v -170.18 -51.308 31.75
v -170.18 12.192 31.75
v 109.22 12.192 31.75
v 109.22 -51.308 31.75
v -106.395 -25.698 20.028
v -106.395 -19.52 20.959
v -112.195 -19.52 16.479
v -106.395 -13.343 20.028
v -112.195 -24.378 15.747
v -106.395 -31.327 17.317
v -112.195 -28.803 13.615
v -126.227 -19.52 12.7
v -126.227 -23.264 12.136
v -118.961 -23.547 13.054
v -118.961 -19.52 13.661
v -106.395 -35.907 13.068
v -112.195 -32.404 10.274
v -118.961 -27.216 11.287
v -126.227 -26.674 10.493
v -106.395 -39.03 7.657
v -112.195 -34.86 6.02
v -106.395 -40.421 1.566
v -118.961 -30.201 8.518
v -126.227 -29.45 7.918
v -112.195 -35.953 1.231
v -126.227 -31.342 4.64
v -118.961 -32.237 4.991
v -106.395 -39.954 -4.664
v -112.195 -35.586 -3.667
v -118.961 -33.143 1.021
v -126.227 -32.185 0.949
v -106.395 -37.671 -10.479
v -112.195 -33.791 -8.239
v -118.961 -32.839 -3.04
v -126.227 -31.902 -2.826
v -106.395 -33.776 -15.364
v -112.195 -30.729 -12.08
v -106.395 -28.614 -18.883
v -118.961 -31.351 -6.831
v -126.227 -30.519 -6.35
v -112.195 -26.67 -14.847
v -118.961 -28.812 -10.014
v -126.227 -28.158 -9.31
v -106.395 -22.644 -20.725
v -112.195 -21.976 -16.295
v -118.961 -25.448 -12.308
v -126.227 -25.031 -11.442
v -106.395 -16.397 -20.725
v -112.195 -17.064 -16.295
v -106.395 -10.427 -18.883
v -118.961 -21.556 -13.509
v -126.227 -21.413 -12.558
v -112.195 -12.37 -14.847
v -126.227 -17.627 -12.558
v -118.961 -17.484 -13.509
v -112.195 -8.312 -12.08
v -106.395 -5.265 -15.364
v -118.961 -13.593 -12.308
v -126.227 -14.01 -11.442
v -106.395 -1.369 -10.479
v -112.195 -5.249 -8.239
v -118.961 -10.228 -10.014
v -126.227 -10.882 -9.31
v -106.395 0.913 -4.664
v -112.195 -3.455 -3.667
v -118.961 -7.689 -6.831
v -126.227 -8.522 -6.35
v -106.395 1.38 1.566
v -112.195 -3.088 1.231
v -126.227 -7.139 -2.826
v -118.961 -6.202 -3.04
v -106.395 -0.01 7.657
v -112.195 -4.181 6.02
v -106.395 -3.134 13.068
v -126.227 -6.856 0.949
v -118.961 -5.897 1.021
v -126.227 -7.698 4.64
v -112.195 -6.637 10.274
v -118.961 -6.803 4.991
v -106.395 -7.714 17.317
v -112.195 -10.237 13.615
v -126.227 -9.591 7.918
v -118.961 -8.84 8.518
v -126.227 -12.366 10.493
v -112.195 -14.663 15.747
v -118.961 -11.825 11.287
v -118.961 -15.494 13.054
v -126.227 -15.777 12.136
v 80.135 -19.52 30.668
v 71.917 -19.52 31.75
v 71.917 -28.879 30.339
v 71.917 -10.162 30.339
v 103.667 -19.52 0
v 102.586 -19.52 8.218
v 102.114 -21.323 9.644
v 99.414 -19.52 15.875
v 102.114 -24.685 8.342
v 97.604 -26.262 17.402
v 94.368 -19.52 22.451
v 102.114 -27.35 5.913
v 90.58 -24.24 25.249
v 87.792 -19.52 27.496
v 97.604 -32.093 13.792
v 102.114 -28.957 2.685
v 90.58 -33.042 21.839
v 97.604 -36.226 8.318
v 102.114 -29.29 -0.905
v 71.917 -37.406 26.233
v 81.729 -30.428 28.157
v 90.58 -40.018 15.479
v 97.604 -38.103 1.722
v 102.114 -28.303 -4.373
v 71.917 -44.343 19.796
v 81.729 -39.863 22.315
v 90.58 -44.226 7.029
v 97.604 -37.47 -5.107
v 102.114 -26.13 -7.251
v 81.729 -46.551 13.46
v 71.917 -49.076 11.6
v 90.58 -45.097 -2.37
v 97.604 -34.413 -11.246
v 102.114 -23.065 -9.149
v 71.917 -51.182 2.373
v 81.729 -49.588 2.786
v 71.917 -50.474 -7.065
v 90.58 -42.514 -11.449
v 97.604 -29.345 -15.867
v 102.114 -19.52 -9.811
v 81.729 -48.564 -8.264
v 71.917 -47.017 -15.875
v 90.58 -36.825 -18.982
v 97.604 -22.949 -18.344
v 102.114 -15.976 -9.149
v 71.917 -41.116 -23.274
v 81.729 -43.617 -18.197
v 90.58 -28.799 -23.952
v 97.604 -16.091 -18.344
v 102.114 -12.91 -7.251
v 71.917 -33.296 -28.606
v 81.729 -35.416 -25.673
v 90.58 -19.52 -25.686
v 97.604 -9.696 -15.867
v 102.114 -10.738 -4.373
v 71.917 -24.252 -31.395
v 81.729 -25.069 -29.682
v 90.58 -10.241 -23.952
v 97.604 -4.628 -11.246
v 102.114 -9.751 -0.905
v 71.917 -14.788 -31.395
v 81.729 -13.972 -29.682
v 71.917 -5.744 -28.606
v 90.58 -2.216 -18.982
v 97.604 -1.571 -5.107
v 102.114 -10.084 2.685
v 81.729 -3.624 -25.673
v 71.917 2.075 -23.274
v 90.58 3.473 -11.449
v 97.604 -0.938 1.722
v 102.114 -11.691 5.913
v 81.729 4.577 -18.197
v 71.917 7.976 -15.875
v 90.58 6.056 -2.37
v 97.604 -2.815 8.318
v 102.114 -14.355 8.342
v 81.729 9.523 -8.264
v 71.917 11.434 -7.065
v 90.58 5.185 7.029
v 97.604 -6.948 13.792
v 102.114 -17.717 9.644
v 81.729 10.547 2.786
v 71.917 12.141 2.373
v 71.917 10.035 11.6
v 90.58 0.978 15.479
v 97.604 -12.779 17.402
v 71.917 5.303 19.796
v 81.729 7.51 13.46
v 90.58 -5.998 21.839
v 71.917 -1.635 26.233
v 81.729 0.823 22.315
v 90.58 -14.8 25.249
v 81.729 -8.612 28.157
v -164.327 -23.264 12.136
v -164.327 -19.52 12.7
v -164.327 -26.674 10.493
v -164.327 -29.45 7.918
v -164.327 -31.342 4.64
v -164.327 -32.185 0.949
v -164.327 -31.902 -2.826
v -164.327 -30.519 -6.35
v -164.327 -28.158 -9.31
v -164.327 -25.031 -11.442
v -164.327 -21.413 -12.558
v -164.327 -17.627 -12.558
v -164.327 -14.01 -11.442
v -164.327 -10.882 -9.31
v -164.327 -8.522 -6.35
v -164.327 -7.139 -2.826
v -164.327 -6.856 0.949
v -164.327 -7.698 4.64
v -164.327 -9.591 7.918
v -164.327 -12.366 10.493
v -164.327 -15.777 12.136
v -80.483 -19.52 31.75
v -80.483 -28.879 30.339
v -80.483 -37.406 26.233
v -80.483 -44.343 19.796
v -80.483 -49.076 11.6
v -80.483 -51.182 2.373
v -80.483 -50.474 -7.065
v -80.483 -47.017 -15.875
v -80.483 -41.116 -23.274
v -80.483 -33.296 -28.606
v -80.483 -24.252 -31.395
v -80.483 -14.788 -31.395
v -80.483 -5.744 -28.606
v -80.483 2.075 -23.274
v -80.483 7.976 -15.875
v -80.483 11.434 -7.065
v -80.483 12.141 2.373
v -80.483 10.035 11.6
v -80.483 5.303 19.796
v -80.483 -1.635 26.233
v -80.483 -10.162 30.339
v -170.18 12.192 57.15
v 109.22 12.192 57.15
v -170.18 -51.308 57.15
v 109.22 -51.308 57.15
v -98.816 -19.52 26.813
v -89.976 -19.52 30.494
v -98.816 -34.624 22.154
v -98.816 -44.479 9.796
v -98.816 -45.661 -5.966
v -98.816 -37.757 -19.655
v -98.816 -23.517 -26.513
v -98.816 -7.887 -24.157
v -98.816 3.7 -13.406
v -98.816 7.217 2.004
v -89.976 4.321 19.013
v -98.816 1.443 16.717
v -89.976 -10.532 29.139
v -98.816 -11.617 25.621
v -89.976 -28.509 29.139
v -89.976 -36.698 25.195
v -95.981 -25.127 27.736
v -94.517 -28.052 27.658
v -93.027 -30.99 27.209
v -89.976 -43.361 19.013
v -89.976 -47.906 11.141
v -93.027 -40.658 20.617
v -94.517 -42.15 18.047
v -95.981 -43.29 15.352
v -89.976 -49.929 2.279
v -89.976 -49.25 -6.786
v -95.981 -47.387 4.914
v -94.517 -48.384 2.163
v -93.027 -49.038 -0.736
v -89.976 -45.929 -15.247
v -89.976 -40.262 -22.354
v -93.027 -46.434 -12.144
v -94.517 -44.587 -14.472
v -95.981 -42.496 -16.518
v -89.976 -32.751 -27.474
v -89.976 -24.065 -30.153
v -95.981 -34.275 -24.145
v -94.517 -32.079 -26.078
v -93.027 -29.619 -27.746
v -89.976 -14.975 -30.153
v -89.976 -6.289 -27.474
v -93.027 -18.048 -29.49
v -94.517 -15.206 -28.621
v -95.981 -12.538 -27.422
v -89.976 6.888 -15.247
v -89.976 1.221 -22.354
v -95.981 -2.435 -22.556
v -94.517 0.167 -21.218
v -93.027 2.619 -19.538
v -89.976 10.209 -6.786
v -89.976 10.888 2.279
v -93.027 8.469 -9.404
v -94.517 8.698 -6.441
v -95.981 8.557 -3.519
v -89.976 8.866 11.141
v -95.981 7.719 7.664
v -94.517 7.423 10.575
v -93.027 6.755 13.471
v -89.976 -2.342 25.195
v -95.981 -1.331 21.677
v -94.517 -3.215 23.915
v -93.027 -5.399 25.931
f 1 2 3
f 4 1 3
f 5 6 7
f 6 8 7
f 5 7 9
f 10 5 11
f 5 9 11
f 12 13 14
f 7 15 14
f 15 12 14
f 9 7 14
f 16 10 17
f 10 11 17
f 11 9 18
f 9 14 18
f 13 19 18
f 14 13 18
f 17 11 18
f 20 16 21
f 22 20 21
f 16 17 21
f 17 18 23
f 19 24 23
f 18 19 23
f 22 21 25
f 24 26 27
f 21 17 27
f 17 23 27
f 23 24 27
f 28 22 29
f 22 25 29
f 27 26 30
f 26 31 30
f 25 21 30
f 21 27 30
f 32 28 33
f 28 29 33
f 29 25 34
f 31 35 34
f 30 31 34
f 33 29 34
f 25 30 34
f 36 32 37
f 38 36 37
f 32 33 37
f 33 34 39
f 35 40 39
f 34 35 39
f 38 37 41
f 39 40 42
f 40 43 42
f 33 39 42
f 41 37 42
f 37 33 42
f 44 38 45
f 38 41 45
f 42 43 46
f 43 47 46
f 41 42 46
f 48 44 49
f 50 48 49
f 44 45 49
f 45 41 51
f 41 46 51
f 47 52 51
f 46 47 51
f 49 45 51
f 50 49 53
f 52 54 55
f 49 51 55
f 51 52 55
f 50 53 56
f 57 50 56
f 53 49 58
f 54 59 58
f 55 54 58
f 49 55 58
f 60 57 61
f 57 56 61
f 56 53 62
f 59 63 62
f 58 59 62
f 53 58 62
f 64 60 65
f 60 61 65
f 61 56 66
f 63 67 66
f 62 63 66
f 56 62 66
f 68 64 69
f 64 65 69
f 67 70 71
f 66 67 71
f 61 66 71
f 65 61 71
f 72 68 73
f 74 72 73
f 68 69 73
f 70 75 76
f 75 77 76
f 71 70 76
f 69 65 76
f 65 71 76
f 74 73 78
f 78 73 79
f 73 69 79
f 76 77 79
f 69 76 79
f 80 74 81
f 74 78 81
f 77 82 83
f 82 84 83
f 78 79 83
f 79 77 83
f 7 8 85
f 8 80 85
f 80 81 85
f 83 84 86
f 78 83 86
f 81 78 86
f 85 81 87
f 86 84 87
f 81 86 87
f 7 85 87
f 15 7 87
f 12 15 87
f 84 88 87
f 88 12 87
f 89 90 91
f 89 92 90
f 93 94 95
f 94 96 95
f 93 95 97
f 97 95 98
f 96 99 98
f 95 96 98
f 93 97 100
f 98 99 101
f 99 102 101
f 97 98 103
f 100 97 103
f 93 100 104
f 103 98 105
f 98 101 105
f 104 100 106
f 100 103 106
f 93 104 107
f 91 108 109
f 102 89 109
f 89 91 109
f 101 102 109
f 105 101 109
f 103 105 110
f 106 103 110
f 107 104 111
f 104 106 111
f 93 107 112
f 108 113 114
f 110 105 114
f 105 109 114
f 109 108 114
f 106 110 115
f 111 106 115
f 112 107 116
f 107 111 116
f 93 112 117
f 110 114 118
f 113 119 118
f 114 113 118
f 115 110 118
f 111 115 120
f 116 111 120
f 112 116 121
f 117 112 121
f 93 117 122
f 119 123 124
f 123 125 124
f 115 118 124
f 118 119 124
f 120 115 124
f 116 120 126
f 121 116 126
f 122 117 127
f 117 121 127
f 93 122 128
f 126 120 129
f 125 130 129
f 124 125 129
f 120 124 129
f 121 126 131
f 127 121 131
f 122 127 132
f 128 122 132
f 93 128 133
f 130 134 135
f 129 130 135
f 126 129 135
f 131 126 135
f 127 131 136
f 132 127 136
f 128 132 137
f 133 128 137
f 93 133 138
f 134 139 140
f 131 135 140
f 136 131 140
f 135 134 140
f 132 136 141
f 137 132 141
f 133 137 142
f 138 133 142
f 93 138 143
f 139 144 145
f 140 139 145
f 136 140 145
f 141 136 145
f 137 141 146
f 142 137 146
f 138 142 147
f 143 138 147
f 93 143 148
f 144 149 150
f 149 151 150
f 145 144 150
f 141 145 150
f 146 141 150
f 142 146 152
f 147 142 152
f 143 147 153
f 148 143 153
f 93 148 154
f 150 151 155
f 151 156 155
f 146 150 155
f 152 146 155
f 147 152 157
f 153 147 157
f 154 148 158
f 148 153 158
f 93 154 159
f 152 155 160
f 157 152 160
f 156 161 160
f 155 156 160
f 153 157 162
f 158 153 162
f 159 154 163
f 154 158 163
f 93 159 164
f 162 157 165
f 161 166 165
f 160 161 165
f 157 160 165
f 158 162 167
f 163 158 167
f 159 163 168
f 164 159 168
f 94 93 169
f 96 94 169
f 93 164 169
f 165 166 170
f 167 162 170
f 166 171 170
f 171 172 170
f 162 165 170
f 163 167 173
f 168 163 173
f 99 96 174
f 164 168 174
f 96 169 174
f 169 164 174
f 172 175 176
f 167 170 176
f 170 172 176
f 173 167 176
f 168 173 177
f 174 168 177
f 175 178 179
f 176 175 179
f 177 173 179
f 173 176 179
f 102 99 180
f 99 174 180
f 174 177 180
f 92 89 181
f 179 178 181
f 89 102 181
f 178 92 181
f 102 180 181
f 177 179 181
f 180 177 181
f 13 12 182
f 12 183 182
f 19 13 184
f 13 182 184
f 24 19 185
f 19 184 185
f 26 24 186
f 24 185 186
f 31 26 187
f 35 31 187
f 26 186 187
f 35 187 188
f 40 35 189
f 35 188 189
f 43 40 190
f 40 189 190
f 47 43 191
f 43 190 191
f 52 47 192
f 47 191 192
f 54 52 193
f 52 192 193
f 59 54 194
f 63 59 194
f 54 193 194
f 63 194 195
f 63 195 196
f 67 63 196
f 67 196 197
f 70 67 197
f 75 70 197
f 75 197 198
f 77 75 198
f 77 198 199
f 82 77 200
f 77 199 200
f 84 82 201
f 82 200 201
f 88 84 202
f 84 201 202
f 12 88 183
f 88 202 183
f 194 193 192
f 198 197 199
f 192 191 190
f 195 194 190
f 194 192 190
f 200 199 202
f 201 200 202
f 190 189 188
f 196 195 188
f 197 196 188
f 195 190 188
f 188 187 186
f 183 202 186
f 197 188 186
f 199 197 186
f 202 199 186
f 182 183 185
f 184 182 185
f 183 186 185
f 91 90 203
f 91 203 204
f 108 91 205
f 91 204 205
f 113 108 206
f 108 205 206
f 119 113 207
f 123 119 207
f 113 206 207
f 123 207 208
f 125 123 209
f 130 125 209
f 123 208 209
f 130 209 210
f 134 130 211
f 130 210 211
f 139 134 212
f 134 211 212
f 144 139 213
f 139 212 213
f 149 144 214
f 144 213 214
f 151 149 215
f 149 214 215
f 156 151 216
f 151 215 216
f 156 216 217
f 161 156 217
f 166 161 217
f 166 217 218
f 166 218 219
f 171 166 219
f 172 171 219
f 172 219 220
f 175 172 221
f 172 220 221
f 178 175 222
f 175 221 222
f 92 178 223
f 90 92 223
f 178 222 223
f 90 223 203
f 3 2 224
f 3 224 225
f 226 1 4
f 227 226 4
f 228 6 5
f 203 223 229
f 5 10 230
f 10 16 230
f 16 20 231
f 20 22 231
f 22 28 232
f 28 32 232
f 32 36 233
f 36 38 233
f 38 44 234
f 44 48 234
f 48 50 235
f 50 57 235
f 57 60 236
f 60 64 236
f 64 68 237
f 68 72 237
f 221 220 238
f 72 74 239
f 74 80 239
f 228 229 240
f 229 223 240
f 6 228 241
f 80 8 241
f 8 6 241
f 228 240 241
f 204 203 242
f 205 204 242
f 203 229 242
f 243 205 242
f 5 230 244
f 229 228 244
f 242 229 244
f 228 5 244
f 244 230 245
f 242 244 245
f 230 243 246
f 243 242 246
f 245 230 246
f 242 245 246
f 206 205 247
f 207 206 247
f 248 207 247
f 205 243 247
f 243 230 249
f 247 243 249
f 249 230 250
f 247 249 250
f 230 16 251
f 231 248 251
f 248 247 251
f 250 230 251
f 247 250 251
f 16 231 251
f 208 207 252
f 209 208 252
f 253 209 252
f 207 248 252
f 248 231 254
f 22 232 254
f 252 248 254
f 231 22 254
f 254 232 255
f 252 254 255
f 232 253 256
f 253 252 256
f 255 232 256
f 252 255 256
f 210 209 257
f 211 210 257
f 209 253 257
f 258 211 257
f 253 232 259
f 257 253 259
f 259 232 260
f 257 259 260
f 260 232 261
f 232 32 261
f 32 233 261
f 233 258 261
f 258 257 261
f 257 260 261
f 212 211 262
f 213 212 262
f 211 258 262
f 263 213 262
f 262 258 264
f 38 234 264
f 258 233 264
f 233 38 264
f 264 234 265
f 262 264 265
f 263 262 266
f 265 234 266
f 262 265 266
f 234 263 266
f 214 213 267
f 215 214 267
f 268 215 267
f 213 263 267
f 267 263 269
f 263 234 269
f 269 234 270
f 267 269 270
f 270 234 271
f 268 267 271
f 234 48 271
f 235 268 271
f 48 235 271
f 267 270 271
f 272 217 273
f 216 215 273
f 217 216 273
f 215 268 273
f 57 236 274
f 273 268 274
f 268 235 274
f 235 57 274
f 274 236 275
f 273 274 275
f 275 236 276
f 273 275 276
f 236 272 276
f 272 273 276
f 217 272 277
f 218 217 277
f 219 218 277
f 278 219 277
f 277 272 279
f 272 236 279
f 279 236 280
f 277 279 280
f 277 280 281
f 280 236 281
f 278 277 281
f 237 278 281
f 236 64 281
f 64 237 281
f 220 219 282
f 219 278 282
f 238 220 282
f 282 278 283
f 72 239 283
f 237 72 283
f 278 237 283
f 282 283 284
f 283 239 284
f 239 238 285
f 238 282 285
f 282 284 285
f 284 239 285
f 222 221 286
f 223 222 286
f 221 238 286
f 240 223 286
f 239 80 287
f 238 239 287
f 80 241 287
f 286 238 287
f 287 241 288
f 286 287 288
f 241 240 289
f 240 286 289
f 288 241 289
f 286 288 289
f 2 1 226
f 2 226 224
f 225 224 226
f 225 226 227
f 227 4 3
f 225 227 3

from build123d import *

# Parameters (mm, degrees)
SKETCH2_W           = 279.4
SKETCH2_H           = 63.5
BOSS_EXTRUDE1_DEPTH = 25.4


with BuildPart() as part:
    # Sketch1 → Revolve2 (revolve)
    with BuildSketch(Plane.XY, mode=Mode.PRIVATE) as revolve2_sk:
        with BuildLine():
            Line((-126.226742161, -6.820301867), (-164.326742161, -6.820301867))
            Line((-164.326742161, -6.820301867), (-164.326742161, -19.520301867))
            Line((-164.326742161, -19.520301867), (103.66748842, -19.520301867))
            ThreePointArc((103.66748842, -19.520301867), (94.368128723, 2.930338436), (71.91748842, 12.229698133))
            Line((71.91748842, 12.229698133), (-80.48251158, 12.229698133))
            ThreePointArc((-80.48251158, 12.229698133), (-94.517345864, 9.424103828), (-106.395004854, 1.438545006))
            ThreePointArc((-106.395004854, 1.438545006), (-115.485392661, -4.673082428), (-126.226742161, -6.820301867))
        make_face()
    revolve(revolve2_sk.sketch.rotate(Axis((-164.326742161, -19.520301867, 0), (1, 0, 0)), 90), axis=Axis((-164.326742161, -19.520301867, 0), (1, 0, 0)))


with BuildPart() as body_2:
    # Sketch2 → Boss-Extrude1 (new body)
    with BuildSketch(Plane.XY.offset(31.75)):
        with Locations((-30.48, -19.558)):
            Rectangle(SKETCH2_W, SKETCH2_H)
    extrude(amount=BOSS_EXTRUDE1_DEPTH)


solid = Compound([part.part, body_2.part])
